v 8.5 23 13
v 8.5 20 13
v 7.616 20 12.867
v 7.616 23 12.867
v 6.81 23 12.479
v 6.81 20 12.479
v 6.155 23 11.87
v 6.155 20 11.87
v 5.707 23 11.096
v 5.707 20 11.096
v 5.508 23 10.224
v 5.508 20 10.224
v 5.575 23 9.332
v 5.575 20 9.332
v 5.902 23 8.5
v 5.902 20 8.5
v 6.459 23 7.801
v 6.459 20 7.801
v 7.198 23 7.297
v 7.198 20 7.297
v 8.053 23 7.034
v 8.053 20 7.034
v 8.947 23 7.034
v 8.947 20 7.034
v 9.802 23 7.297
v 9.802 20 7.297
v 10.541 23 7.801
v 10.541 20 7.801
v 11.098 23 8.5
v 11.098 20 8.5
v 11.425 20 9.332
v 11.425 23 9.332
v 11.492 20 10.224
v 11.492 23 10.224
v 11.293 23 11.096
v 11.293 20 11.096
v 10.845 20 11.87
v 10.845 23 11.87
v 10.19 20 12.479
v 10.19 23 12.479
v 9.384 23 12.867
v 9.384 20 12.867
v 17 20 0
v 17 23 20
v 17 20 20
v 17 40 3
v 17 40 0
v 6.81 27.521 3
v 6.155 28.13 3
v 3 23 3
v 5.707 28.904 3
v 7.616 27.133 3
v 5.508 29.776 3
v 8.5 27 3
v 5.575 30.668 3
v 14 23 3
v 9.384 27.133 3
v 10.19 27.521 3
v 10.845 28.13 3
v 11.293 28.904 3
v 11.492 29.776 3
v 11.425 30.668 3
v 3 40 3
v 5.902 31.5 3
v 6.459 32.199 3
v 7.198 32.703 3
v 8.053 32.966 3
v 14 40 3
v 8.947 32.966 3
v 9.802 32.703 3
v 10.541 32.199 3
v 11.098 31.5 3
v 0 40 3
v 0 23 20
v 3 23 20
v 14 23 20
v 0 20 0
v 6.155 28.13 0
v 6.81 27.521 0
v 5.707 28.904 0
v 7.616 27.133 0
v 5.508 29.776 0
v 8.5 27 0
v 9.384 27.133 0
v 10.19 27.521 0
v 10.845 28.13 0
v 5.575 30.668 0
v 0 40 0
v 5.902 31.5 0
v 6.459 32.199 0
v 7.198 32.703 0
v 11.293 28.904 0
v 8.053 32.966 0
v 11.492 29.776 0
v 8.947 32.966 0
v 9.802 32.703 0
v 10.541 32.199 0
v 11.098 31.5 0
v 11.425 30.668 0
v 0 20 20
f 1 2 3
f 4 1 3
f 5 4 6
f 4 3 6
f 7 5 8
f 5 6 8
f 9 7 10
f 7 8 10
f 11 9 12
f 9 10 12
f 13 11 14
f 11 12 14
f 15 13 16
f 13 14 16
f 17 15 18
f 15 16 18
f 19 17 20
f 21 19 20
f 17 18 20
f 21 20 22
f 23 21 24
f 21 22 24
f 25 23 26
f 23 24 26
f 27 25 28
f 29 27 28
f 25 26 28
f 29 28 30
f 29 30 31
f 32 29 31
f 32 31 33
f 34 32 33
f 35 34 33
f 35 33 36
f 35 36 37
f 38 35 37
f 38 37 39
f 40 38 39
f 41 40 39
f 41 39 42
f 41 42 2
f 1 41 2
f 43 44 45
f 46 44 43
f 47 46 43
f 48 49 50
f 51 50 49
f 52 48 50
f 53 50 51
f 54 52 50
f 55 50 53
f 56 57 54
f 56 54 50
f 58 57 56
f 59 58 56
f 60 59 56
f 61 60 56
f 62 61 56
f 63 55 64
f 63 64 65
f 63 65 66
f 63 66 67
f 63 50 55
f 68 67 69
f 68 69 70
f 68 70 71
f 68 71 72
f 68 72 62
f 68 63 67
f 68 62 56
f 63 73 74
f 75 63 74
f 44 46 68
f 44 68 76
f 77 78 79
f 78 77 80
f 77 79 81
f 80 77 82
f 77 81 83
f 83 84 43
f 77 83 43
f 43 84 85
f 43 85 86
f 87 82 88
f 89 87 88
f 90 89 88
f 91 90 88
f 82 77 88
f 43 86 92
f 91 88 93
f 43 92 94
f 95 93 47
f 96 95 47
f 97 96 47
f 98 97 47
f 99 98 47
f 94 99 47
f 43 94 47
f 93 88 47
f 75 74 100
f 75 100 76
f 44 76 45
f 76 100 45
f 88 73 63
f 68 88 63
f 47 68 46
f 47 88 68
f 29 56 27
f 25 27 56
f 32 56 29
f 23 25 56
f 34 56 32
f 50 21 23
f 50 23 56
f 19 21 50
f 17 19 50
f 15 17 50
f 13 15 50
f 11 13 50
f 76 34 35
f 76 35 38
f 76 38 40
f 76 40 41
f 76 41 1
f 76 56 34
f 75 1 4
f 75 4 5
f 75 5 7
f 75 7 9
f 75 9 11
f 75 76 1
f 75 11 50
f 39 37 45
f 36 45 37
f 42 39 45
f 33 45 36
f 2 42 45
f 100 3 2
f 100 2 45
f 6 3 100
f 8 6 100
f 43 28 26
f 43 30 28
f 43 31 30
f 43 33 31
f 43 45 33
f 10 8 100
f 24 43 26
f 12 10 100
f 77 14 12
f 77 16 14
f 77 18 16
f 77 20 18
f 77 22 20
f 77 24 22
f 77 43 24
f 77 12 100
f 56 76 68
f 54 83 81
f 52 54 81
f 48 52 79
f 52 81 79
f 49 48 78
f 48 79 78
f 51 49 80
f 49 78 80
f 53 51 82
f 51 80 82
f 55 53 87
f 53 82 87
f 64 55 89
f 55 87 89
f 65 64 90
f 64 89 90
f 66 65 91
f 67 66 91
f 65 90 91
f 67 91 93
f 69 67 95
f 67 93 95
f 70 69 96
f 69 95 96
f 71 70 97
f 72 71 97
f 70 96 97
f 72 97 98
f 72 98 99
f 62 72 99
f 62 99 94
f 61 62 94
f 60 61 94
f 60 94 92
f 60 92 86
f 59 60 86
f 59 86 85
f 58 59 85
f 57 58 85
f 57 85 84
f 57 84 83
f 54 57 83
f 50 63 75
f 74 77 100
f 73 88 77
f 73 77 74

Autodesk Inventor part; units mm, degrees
ref_plane "YZ Plane" through (0, 0, 0) normal (1, 0, 0) x (0, 1, 0)
ref_plane "XZ Plane" through (0, 0, 0) normal (0, 1, 0) x (-1, 0, 0)
ref_plane "XY Plane" through (0, 0, 0) normal (0, 0, 1) x (1, 0, 0)
ref_plane "Arbeitsebene7" through (0, 0, 0) normal (0, 0, 1) x (1, 0, 0)
sketch "Skizze1" plane through (0, 0, 0) normal (0, 0, 1) x (1, 0, 0)
  line L0 (12, 20) -> (17, 20) projected
  line L1 (0, 20) -> (5, 20) projected
  line L2 (17, 20) -> (0, 20)
  line L3 (0, 20) -> (0, 40)
  line L4 (0, 40) -> (17, 40)
  line L5 (17, 40) -> (17, 20)
  point P0 (0, 0)
  dimension "d0" = 20
extrude "Extrusion1" add sketch "Skizze1" along normal blind 3
ref_plane "Arbeitsebene6" through (5, 20, 0) normal (0, 1, 0) x (-1, 0, 0)
sketch "Skizze2" plane through (5, 20, 0) normal (0, 1, 0) x (-1, 0, 0)
  line L0 (-12, 0) -> (-12, 400) projected
  line L1 (5, 3) -> (-12, 3) projected
  line L2 (-12, 3) -> (5, 3)
  line L3 (5, 3) -> (5, 20)
  line L4 (5, 20) -> (-12, 20)
  line L5 (-12, 20) -> (-12, 3)
  point P0 (5, 0)
  dimension "d3" = 17
extrude "Extrusion2" add sketch "Skizze2" along normal blind 3
ref_plane "Arbeitsebene5" through (0, 20, 0) normal (-1, 0, 0) x (0, 0, 1)
sketch "Skizze4" plane through (0, 20, 0) normal (-1, 0, 0) x (0, 0, 1)
  line L0 (3, 3) -> (3, 20) projected
  line L1 (20, 3) -> (3, 3) projected
  line L2 (3, 20) -> (20, 3)
  line L3 (20, 3) -> (3, 3)
  line L4 (0, 20) -> (3, 20) projected
  line L5 (3, 3) -> (3, 20)
  point P0 (0, -20)
extrude "Extrusion3" add sketch "Skizze4" against normal blind 3
ref_plane "Arbeitsebene4" through (17, 20, 0) normal (1, 0, 0) x (0, 0, -1)
sketch "Skizze5" plane through (17, 20, 0) normal (1, 0, 0) x (0, 0, -1)
  line L0 (-3, 3) -> (-3, 20) projected
  line L1 (-3, 20) -> (-3, 3)
  line L2 (-20, 3) -> (-3, 3) projected
  line L3 (-3, 3) -> (-20, 3)
  line L4 (-3, 20) -> (-20, 3) projected
  line L5 (-20, 3) -> (-3, 20)
  point P0 (0, -20)
extrude "Extrusion4" add sketch "Skizze5" against normal blind 3
hole "Bohrung3" at (8.5, 30, 3) direction (0, 0, -1) diameter 6 end through all
hole "Bohrung4" at (8.5, 23, 10) direction (0, -1, 0) diameter 6 end through all
properties part number "Corner Piece" material "Aluminum 6061-AHC"
